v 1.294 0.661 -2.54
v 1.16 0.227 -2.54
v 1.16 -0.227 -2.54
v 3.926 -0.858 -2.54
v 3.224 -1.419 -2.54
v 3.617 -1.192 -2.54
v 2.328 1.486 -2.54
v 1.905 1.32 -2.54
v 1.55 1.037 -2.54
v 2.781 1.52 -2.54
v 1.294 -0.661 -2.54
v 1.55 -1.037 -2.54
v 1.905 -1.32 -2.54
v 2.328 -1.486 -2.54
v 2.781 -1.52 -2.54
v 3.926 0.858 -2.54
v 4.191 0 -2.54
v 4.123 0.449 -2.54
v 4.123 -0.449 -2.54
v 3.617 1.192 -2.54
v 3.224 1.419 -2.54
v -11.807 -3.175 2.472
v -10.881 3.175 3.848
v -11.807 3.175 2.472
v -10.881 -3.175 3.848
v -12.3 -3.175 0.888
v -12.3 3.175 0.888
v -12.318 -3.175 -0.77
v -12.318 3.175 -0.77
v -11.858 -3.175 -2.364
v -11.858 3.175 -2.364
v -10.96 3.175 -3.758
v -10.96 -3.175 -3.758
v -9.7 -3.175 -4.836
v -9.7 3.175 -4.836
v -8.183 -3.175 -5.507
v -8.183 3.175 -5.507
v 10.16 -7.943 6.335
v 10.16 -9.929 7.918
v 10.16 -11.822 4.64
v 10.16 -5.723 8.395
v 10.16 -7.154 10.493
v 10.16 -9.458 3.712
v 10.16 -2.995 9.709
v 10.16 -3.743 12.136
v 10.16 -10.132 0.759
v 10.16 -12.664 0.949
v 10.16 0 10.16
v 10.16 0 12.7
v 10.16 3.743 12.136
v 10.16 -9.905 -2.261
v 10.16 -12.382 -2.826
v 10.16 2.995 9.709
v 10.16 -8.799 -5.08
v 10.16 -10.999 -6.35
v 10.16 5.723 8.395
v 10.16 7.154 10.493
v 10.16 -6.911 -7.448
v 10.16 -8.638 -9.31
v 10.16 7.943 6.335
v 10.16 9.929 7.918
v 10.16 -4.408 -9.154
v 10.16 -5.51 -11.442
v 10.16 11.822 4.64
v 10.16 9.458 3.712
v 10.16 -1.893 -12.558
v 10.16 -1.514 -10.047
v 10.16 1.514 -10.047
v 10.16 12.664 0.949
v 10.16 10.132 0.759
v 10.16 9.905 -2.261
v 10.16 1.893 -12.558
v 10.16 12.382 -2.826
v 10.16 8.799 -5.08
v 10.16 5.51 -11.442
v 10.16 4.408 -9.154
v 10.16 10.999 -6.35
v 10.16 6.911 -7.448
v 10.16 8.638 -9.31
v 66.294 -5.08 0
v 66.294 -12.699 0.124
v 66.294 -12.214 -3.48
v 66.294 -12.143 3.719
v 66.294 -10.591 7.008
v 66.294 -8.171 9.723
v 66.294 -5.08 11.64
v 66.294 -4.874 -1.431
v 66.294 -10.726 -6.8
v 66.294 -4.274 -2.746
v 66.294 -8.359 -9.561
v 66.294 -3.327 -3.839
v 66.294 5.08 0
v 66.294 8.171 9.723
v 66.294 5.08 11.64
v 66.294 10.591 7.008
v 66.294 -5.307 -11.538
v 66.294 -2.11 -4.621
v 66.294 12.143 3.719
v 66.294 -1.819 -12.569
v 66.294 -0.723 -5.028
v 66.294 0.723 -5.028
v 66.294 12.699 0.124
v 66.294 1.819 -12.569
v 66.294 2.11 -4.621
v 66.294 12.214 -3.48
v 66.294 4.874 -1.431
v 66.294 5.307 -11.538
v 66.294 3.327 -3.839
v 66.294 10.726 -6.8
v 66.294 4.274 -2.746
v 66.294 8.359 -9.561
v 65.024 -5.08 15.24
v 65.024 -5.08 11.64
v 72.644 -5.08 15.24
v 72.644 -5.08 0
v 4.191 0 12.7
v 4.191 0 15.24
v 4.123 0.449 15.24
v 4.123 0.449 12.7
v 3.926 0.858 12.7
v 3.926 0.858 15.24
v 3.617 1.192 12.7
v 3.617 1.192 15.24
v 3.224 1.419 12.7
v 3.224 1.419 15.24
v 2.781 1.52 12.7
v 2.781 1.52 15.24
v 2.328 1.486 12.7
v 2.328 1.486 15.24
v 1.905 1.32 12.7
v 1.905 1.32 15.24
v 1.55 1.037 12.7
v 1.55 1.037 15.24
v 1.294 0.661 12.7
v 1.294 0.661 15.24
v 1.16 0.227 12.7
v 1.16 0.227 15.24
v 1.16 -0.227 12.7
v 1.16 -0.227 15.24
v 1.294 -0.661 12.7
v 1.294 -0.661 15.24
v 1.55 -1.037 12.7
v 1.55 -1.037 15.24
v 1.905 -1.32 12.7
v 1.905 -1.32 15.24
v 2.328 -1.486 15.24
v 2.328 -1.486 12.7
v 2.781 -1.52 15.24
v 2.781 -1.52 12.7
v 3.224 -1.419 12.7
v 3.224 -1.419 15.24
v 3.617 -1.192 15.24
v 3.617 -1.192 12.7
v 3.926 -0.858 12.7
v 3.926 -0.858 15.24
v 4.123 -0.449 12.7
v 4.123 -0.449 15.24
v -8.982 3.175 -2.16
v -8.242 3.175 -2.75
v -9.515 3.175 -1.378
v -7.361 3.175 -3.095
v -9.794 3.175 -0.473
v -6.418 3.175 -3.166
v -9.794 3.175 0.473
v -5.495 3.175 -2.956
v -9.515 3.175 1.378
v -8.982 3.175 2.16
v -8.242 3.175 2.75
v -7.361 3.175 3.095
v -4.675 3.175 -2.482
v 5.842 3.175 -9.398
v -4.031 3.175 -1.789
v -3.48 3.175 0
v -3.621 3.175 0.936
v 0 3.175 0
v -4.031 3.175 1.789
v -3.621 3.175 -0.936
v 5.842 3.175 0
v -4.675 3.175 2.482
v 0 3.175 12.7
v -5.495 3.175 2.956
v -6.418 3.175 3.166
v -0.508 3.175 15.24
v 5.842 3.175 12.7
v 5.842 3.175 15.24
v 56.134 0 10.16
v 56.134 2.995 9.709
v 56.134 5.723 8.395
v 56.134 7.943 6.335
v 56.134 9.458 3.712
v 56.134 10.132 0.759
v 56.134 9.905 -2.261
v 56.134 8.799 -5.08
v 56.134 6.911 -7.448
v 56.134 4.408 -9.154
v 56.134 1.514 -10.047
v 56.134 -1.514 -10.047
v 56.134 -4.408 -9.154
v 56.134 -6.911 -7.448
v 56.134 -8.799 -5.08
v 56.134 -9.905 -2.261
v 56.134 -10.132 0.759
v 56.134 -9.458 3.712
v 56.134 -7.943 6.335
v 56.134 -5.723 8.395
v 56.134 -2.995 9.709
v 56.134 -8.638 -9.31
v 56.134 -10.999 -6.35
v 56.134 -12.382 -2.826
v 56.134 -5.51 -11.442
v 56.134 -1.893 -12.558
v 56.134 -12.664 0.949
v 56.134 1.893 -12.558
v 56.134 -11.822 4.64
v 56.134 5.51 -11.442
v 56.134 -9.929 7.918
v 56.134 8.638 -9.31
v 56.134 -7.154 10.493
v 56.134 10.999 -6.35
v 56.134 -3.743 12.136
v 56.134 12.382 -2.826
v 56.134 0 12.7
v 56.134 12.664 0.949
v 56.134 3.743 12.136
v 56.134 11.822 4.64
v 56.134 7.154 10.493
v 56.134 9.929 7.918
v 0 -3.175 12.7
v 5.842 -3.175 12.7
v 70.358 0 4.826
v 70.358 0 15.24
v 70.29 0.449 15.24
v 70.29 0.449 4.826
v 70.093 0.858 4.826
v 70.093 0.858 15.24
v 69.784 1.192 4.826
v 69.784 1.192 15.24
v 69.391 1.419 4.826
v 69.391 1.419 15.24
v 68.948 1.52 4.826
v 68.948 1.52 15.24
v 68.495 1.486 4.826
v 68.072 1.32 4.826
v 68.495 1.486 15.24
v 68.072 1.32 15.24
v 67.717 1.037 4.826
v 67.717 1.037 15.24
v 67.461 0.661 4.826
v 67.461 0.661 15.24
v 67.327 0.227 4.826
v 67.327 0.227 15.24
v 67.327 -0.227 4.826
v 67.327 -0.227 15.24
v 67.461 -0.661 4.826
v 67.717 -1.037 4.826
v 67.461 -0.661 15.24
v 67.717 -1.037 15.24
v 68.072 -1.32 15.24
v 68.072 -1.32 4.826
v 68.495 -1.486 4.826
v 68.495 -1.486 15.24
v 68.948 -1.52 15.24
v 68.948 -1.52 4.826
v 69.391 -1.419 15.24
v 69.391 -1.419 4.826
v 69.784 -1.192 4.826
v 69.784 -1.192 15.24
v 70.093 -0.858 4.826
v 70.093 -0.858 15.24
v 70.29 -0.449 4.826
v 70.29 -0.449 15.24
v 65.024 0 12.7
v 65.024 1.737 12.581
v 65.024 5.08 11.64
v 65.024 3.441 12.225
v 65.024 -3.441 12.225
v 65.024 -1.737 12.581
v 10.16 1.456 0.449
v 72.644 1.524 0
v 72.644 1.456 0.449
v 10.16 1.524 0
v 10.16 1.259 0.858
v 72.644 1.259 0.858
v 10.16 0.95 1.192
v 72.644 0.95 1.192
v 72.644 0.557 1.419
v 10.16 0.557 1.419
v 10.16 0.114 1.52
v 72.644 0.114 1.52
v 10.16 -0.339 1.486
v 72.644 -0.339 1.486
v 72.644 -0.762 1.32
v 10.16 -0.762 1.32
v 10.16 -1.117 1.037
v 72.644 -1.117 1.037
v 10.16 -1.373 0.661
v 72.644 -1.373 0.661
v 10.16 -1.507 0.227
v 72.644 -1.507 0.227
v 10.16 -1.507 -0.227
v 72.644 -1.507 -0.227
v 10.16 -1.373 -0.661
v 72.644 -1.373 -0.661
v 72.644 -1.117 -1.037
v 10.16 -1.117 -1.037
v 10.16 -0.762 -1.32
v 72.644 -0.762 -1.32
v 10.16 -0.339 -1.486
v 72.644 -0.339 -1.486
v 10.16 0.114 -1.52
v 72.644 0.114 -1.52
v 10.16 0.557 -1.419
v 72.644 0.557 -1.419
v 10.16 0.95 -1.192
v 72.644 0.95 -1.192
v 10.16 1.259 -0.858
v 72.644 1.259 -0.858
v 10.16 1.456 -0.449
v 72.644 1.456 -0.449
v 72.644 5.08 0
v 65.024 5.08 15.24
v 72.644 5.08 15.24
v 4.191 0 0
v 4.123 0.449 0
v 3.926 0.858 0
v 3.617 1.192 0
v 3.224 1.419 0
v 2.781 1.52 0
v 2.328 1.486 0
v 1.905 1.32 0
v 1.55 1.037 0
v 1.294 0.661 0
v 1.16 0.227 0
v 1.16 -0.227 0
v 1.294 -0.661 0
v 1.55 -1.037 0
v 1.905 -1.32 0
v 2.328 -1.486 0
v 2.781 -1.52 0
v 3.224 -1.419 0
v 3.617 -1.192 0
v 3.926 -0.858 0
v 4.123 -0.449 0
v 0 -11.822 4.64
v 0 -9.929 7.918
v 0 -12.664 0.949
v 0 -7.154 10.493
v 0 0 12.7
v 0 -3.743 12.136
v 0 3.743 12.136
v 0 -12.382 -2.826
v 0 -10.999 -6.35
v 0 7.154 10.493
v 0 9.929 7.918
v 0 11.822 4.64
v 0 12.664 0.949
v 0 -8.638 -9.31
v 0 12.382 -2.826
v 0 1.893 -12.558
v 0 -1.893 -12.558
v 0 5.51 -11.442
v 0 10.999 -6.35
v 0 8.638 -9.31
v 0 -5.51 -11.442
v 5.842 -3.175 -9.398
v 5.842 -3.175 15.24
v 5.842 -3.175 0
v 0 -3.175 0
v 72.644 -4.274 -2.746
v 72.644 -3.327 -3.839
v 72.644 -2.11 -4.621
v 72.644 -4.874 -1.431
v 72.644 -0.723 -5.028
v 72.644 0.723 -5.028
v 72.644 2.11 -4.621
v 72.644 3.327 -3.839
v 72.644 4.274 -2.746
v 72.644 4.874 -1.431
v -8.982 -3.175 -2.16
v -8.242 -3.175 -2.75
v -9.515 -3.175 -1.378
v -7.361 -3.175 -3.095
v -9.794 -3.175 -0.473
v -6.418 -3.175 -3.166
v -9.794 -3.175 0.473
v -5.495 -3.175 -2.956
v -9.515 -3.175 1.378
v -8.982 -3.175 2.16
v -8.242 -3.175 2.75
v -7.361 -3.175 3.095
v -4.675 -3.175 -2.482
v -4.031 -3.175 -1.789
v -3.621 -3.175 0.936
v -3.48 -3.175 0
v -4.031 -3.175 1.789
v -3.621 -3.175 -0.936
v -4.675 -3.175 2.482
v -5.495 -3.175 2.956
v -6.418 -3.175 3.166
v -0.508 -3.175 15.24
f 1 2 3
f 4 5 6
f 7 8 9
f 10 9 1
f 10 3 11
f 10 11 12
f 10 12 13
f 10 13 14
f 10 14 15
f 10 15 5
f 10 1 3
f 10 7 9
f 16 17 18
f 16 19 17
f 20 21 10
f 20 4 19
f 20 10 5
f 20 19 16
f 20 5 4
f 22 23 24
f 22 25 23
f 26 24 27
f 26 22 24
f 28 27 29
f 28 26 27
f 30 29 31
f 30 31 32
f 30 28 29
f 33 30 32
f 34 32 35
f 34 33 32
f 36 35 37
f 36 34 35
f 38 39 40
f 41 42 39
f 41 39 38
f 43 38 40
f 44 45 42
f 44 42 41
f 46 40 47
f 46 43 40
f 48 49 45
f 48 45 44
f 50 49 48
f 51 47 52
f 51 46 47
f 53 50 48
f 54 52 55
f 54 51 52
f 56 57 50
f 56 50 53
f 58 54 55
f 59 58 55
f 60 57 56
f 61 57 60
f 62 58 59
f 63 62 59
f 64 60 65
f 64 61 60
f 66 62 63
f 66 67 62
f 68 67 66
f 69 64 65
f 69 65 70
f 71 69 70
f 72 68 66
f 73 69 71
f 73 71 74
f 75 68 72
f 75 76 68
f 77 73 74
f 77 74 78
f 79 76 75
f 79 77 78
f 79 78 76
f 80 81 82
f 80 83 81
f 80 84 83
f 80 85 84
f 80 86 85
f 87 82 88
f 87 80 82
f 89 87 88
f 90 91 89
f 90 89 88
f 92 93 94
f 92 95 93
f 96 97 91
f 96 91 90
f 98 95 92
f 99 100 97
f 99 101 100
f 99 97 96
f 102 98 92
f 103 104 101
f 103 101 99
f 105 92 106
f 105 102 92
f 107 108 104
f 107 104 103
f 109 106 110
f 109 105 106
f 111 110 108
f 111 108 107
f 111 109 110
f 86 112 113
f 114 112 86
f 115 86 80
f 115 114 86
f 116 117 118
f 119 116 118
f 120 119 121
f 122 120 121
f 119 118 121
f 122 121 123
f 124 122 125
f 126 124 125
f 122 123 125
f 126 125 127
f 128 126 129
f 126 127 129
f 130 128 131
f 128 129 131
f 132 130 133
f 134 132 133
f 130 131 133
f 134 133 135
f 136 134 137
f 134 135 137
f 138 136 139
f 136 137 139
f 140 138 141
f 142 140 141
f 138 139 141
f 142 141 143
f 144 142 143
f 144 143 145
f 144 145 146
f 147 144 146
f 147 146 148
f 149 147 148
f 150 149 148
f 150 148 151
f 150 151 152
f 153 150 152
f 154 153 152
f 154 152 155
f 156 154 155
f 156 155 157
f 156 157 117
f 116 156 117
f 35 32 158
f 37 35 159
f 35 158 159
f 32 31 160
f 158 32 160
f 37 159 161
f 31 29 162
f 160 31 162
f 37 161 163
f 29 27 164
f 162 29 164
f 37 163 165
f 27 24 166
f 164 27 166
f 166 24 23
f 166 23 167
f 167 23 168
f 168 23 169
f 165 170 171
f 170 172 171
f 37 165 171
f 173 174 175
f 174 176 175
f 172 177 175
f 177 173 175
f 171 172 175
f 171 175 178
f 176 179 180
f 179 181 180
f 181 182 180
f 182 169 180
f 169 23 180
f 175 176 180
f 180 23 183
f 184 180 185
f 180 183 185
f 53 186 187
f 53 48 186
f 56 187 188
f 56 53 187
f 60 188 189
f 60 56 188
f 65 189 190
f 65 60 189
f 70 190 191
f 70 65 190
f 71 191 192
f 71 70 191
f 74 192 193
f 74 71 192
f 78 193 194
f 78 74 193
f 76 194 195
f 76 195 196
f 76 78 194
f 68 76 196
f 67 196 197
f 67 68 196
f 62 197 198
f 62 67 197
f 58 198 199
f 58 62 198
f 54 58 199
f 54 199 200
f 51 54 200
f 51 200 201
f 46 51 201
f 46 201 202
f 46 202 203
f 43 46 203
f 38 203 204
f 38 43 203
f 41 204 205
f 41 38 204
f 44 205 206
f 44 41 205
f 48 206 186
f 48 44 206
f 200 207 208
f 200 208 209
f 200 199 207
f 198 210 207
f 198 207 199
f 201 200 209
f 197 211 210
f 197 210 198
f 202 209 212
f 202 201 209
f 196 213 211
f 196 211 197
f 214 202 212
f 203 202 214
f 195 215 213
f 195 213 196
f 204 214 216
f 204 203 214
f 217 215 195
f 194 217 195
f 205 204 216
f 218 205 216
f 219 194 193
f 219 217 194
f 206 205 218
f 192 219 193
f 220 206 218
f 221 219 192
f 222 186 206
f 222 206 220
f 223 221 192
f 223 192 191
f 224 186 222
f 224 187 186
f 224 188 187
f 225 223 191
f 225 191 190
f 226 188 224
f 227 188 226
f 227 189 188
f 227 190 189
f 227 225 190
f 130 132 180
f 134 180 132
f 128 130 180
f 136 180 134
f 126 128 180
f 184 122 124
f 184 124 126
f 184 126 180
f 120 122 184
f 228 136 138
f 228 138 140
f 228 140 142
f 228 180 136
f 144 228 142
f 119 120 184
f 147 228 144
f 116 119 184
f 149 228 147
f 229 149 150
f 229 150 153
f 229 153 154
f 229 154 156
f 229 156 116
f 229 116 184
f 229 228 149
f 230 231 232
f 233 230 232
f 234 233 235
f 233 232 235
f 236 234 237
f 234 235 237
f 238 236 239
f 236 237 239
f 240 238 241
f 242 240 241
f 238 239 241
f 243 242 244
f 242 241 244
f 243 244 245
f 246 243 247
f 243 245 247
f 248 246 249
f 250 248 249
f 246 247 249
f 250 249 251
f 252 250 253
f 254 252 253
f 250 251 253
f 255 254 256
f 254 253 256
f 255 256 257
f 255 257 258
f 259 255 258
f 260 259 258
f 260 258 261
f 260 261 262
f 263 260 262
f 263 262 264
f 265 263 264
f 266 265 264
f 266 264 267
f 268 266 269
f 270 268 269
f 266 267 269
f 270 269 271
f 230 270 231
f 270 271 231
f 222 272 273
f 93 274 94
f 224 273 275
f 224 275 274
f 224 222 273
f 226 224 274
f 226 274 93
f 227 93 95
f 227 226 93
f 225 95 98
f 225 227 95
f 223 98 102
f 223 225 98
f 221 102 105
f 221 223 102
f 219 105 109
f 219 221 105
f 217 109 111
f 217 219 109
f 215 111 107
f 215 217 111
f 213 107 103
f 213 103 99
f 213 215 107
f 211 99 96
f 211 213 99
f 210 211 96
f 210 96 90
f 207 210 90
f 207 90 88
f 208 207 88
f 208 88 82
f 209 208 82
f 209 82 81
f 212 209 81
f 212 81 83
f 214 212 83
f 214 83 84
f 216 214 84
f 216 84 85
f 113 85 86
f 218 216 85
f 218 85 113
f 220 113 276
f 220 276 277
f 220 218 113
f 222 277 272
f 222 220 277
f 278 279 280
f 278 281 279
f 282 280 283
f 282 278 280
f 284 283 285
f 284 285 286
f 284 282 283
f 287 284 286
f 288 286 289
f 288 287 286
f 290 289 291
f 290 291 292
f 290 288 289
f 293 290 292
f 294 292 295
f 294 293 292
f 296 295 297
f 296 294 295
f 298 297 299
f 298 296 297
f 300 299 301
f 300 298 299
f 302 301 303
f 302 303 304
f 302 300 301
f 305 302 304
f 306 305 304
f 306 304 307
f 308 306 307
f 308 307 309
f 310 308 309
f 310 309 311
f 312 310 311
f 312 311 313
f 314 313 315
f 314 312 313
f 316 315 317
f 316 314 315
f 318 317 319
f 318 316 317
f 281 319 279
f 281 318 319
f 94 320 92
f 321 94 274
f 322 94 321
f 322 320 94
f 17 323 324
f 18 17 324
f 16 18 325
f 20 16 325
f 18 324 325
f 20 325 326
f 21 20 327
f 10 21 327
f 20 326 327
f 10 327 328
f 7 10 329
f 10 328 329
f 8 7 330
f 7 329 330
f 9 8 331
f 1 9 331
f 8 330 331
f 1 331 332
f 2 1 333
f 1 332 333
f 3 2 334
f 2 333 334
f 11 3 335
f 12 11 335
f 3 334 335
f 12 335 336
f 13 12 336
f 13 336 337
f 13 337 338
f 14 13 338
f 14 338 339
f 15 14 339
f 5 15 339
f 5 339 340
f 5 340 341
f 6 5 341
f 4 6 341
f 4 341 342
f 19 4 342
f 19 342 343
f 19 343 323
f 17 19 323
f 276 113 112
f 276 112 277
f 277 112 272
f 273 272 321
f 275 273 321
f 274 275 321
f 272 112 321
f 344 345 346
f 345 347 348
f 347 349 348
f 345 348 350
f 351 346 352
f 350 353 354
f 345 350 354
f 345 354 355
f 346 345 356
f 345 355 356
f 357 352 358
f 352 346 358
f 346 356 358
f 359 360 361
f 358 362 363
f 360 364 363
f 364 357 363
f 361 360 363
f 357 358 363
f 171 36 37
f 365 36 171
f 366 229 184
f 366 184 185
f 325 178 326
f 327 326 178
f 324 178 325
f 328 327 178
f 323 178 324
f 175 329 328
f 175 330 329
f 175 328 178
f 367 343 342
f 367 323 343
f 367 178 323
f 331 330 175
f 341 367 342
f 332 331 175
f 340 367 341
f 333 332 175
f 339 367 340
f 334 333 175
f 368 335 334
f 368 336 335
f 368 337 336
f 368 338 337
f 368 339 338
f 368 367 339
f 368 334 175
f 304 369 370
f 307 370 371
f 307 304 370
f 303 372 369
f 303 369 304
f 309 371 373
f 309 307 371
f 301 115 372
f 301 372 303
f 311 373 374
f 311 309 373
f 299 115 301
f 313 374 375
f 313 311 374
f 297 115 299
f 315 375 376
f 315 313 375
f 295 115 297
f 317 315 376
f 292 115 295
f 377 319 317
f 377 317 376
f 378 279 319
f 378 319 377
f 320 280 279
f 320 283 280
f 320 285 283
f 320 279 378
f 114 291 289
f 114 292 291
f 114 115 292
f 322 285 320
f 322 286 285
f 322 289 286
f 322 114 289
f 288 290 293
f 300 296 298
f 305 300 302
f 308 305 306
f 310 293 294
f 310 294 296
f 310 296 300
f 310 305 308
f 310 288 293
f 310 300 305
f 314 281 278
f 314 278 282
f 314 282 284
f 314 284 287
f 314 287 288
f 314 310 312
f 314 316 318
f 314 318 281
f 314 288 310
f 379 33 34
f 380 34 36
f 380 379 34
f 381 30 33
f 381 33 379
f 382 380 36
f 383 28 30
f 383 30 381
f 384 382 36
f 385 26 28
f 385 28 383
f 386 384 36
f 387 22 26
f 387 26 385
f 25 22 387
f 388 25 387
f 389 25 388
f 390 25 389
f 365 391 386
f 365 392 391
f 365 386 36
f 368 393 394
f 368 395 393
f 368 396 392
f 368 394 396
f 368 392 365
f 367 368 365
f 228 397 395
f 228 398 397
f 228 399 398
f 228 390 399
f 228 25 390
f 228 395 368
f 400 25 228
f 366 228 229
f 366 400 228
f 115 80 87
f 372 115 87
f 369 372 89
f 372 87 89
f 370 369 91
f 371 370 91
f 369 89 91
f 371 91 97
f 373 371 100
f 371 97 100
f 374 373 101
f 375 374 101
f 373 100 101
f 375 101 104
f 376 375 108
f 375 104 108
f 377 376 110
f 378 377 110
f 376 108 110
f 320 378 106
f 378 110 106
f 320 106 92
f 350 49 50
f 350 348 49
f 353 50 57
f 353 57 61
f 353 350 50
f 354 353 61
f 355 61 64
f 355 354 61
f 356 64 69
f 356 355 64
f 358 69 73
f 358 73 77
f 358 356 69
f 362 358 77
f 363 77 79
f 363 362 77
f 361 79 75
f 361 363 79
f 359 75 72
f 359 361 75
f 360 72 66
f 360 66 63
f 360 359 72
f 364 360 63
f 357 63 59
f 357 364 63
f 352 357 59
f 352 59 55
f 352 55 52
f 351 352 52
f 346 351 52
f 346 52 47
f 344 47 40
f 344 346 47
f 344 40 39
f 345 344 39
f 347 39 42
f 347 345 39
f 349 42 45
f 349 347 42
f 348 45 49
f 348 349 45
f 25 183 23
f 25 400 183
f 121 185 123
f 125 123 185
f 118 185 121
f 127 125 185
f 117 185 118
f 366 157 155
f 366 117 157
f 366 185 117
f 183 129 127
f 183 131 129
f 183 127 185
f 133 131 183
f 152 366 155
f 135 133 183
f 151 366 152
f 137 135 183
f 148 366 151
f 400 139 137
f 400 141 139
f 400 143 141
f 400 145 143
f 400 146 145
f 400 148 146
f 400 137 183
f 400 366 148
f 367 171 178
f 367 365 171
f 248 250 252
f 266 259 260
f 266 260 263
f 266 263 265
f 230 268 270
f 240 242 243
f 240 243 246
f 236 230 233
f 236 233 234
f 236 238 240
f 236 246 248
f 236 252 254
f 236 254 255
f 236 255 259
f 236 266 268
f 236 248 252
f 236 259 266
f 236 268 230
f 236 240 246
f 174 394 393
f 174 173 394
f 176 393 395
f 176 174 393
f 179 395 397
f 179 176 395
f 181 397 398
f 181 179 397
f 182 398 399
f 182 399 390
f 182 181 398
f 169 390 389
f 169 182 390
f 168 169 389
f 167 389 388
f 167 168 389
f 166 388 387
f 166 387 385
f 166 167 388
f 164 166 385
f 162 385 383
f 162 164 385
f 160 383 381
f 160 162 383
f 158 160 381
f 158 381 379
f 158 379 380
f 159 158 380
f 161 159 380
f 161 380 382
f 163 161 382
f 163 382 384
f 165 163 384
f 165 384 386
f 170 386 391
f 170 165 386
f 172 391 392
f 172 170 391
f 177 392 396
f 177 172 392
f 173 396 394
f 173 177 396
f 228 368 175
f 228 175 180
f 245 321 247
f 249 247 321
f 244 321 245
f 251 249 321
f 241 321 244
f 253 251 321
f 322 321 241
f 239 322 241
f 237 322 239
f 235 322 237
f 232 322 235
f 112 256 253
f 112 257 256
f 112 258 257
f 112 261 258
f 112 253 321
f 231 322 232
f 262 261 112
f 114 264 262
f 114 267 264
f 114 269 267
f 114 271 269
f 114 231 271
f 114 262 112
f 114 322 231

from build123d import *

# Parameters (mm, degrees)
F0_W          = 5.842
F0_H          = 12.7
F0_R          = 3.175
F2_DEPTH      = 3.175
F3_R          = 1.524
F4_DEPTH      = 6.35
F4_DEPTH_BACK = 1.27
F5_DEPTH      = 56.134
F6_R          = 1.524
F8_DEPTH      = 17.78
F7_R          = 1.524
F9_DEPTH      = 10.414


with BuildPart() as f1:
    # F0 (on Front) → F1 (revolve)
    with BuildSketch(Plane.XZ):
        Polygon((5.842, 12.7), (5.842, 0), (66.294, 0), (66.294, 12.7), (56.134, 12.7), (56.134, 10.16), (10.16, 10.16), (10.16, 12.7), align=None)
        with Locations((2.921, 6.35)):
            Rectangle(F0_W, F0_H)
    revolve(axis=Axis((33.147, 0, 0), (-1, 0, 0)))

    # F3 (on face) → F4 (join, two sides)
    with BuildSketch(Plane.YZ.offset(66.294)) as f4_sk:
        with BuildLine():
            ThreePointArc((-5.08, 11.6397422652), (0, 12.7), (5.08, 11.6397422652))
            Line((5.08, 11.6397422652), (5.08, 15.24))
            Line((5.08, 15.24), (-5.08, 15.24))
            Line((-5.08, 15.24), (-5.08, 11.6397422652))
        make_face()
        with BuildLine():
            ThreePointArc((-5.08, 0), (0, 5.08), (5.08, 0))
            Line((5.08, 0), (5.08, 11.6397422652))
            ThreePointArc((5.08, 11.6397422652), (0, 12.7), (-5.08, 11.6397422652))
            Line((-5.08, 11.6397422652), (-5.08, 0))
        make_face()
        with BuildLine():
            ThreePointArc((-5.08, 0), (0, -5.08), (5.08, 0))
            ThreePointArc((5.08, 0), (0, 5.08), (-5.08, 0))
        make_face()
        Circle(F3_R, mode=Mode.SUBTRACT)
    extrude(amount=F4_DEPTH)
    extrude(f4_sk.sketch, amount=-F4_DEPTH_BACK)

    # F5 (cut, through all): a face of the model
    f5_faces = [f1.faces().sort_by_distance(p)[0] for p in [
        (66.294, 0, 0),
    ]]
    extrude(f5_faces, amount=-F5_DEPTH, mode=Mode.SUBTRACT)

    # F7 (on face) → F9 (cut)
    with BuildSketch(Plane.XY.offset(15.24)):
        with Locations((68.834, 0)):
            Circle(F7_R)
    extrude(amount=-F9_DEPTH, mode=Mode.SUBTRACT)


with BuildPart() as f2:
    # F0 (on Front) → F2 (new body, symmetric)
    with BuildSketch(Plane.XZ):
        with BuildLine():
            Line((5.842, 0), (0, 0))
            Line((0, 0), (-0.9398, 0))
            ThreePointArc((-0.9398, 0), (-3.1957909266, -4.5493385486), (-8.1826630726, -5.5069827884))
            Line((-8.1826630726, -5.5069827884), (5.842, -9.398))
            Line((5.842, -9.398), (5.842, 0))
        make_face()
        with BuildLine():
            Line((-0.9398, 0), (0, 0))
            Line((0, 0), (0, 12.7))
            Line((0, 12.7), (5.842, 12.7))
            Line((5.842, 12.7), (5.842, 15.24))
            Line((5.842, 15.24), (-0.508, 15.24))
            Line((-0.508, 15.24), (-10.8806298187, 3.8475430269))
            ThreePointArc((-10.8806298187, 3.8475430269), (-4.5919612295, 5.3297205562), (-0.9398, 0))
        make_face()
        with BuildLine():
            ThreePointArc((-8.1826630726, -5.5069827884), (-3.1957909266, -4.5493385486), (-0.9398, 0))
            ThreePointArc((-0.9398, 0), (-4.5919612295, 5.3297205562), (-10.8806298187, 3.8475430269))
            ThreePointArc((-10.8806298187, 3.8475430269), (-12.1459778134, -1.5837270034), (-8.1826630726, -5.5069827884))
        make_face()
        with Locations((-6.6548, 0)):
            Circle(F0_R, mode=Mode.SUBTRACT)
    extrude(amount=F2_DEPTH, both=True)

    # F6 (on face) → F8 (cut)
    with BuildSketch(Plane.XY.offset(15.24)):
        with Locations((2.667, 0)):
            Circle(F6_R)
    extrude(amount=-F8_DEPTH, mode=Mode.SUBTRACT)


solid = Compound([f1.part, f2.part])
